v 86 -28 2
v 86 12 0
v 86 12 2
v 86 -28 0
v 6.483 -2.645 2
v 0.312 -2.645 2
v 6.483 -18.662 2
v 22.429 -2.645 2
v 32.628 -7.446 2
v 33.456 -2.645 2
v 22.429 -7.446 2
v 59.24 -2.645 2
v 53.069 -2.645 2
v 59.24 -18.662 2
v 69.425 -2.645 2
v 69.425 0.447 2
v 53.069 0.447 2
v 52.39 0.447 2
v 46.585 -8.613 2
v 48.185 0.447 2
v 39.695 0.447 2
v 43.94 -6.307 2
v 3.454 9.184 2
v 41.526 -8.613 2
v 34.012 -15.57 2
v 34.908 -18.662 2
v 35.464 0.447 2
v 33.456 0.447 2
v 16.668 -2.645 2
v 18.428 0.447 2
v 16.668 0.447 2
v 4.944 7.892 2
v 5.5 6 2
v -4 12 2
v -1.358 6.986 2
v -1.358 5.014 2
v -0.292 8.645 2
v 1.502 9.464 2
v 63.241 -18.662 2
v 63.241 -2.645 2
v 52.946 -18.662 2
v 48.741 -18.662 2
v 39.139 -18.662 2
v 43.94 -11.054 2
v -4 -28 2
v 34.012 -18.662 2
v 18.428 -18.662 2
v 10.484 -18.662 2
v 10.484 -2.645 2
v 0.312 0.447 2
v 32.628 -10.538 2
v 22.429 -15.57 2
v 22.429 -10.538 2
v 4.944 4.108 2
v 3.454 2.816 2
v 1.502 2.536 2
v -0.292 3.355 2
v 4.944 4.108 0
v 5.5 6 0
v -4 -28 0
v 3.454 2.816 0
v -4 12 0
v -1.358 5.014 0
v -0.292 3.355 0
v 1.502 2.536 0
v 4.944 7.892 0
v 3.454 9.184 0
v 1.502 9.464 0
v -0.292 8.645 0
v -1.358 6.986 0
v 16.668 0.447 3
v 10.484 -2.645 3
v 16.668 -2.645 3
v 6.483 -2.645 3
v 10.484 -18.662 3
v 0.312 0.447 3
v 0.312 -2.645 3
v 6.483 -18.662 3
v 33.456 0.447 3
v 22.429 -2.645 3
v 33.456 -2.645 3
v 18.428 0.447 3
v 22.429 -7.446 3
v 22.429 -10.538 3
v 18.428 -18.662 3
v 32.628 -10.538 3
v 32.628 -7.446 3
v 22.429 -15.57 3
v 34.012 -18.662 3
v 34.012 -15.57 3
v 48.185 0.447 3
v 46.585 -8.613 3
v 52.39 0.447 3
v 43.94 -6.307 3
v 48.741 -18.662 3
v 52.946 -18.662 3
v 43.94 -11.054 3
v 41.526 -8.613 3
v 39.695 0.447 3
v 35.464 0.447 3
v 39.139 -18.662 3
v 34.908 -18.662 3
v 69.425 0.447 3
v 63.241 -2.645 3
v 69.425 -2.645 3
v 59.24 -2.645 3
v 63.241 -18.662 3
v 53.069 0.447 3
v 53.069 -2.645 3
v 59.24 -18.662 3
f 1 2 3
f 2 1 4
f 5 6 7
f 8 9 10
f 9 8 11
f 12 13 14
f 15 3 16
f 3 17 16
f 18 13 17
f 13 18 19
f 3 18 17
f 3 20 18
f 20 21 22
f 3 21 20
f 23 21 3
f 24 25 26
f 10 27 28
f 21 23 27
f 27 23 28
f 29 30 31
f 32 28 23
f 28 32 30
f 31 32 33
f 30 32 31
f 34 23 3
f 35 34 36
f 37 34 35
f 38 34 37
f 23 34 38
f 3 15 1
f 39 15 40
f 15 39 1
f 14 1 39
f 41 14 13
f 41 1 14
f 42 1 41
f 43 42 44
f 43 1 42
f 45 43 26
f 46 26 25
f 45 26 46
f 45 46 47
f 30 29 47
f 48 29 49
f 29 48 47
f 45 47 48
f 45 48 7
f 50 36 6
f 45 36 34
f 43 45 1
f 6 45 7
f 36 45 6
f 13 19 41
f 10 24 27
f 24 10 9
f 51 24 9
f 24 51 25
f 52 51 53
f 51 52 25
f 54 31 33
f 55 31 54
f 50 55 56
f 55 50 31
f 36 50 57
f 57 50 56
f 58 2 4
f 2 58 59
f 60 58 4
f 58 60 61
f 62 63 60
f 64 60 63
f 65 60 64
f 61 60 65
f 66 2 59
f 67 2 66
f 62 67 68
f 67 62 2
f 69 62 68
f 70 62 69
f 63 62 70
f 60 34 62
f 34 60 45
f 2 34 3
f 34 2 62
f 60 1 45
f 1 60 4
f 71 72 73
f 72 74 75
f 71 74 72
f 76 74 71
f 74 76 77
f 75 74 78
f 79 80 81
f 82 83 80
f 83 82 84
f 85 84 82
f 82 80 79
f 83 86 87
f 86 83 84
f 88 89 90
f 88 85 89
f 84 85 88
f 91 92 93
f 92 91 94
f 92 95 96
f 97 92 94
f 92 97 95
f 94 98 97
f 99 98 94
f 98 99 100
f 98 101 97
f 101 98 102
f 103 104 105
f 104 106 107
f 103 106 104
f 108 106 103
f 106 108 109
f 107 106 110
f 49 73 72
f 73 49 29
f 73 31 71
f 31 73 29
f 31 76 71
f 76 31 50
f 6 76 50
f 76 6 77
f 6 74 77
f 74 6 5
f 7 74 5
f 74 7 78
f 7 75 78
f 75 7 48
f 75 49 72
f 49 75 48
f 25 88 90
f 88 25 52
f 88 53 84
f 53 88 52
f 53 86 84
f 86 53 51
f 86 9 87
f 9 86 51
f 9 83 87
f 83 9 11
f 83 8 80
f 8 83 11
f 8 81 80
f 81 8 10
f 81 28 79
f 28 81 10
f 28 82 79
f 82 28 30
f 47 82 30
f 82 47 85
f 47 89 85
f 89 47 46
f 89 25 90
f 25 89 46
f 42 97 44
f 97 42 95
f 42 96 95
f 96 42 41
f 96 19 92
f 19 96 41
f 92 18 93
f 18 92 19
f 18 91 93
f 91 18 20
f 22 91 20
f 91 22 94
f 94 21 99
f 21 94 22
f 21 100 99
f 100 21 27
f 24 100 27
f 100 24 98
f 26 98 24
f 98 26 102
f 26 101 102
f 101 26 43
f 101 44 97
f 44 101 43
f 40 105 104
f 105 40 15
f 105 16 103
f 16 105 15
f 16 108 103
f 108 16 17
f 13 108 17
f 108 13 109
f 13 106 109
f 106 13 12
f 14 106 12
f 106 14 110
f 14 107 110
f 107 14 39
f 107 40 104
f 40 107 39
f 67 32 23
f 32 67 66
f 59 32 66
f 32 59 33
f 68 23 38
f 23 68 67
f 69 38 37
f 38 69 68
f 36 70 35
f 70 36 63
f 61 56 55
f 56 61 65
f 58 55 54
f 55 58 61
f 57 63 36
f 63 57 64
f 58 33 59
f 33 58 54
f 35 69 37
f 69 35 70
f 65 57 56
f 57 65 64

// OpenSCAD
//letter height
    letterheight = 1; // [1,1.5,2,2.5,3,3.5]
//letter size
    lettersize = 20; // [10,11,12,13,14,15,16,17,18,19,20,21,22,23,24,25,26,27,28,29,30,31,32,33,34,35,36,37,38,39,40,41,42,43,44,45,46,47,48,49,50]
//label text
    label =  "TEXT";


module letter(l){
    
    linear_extrude(height = letterheight) {
        text(l, size = lettersize, font = "Arial:style=Bold", halign = "left", valign = "top");
    }
}



difference() { 
    union() {
            translate ([-4,-28,0]) cube([90,40,2], center = false);
            translate([0,0,2])  letter(label);
    }
    
    translate([2,6,0]) cylinder(h=5, r=3.5, center = true);
}
